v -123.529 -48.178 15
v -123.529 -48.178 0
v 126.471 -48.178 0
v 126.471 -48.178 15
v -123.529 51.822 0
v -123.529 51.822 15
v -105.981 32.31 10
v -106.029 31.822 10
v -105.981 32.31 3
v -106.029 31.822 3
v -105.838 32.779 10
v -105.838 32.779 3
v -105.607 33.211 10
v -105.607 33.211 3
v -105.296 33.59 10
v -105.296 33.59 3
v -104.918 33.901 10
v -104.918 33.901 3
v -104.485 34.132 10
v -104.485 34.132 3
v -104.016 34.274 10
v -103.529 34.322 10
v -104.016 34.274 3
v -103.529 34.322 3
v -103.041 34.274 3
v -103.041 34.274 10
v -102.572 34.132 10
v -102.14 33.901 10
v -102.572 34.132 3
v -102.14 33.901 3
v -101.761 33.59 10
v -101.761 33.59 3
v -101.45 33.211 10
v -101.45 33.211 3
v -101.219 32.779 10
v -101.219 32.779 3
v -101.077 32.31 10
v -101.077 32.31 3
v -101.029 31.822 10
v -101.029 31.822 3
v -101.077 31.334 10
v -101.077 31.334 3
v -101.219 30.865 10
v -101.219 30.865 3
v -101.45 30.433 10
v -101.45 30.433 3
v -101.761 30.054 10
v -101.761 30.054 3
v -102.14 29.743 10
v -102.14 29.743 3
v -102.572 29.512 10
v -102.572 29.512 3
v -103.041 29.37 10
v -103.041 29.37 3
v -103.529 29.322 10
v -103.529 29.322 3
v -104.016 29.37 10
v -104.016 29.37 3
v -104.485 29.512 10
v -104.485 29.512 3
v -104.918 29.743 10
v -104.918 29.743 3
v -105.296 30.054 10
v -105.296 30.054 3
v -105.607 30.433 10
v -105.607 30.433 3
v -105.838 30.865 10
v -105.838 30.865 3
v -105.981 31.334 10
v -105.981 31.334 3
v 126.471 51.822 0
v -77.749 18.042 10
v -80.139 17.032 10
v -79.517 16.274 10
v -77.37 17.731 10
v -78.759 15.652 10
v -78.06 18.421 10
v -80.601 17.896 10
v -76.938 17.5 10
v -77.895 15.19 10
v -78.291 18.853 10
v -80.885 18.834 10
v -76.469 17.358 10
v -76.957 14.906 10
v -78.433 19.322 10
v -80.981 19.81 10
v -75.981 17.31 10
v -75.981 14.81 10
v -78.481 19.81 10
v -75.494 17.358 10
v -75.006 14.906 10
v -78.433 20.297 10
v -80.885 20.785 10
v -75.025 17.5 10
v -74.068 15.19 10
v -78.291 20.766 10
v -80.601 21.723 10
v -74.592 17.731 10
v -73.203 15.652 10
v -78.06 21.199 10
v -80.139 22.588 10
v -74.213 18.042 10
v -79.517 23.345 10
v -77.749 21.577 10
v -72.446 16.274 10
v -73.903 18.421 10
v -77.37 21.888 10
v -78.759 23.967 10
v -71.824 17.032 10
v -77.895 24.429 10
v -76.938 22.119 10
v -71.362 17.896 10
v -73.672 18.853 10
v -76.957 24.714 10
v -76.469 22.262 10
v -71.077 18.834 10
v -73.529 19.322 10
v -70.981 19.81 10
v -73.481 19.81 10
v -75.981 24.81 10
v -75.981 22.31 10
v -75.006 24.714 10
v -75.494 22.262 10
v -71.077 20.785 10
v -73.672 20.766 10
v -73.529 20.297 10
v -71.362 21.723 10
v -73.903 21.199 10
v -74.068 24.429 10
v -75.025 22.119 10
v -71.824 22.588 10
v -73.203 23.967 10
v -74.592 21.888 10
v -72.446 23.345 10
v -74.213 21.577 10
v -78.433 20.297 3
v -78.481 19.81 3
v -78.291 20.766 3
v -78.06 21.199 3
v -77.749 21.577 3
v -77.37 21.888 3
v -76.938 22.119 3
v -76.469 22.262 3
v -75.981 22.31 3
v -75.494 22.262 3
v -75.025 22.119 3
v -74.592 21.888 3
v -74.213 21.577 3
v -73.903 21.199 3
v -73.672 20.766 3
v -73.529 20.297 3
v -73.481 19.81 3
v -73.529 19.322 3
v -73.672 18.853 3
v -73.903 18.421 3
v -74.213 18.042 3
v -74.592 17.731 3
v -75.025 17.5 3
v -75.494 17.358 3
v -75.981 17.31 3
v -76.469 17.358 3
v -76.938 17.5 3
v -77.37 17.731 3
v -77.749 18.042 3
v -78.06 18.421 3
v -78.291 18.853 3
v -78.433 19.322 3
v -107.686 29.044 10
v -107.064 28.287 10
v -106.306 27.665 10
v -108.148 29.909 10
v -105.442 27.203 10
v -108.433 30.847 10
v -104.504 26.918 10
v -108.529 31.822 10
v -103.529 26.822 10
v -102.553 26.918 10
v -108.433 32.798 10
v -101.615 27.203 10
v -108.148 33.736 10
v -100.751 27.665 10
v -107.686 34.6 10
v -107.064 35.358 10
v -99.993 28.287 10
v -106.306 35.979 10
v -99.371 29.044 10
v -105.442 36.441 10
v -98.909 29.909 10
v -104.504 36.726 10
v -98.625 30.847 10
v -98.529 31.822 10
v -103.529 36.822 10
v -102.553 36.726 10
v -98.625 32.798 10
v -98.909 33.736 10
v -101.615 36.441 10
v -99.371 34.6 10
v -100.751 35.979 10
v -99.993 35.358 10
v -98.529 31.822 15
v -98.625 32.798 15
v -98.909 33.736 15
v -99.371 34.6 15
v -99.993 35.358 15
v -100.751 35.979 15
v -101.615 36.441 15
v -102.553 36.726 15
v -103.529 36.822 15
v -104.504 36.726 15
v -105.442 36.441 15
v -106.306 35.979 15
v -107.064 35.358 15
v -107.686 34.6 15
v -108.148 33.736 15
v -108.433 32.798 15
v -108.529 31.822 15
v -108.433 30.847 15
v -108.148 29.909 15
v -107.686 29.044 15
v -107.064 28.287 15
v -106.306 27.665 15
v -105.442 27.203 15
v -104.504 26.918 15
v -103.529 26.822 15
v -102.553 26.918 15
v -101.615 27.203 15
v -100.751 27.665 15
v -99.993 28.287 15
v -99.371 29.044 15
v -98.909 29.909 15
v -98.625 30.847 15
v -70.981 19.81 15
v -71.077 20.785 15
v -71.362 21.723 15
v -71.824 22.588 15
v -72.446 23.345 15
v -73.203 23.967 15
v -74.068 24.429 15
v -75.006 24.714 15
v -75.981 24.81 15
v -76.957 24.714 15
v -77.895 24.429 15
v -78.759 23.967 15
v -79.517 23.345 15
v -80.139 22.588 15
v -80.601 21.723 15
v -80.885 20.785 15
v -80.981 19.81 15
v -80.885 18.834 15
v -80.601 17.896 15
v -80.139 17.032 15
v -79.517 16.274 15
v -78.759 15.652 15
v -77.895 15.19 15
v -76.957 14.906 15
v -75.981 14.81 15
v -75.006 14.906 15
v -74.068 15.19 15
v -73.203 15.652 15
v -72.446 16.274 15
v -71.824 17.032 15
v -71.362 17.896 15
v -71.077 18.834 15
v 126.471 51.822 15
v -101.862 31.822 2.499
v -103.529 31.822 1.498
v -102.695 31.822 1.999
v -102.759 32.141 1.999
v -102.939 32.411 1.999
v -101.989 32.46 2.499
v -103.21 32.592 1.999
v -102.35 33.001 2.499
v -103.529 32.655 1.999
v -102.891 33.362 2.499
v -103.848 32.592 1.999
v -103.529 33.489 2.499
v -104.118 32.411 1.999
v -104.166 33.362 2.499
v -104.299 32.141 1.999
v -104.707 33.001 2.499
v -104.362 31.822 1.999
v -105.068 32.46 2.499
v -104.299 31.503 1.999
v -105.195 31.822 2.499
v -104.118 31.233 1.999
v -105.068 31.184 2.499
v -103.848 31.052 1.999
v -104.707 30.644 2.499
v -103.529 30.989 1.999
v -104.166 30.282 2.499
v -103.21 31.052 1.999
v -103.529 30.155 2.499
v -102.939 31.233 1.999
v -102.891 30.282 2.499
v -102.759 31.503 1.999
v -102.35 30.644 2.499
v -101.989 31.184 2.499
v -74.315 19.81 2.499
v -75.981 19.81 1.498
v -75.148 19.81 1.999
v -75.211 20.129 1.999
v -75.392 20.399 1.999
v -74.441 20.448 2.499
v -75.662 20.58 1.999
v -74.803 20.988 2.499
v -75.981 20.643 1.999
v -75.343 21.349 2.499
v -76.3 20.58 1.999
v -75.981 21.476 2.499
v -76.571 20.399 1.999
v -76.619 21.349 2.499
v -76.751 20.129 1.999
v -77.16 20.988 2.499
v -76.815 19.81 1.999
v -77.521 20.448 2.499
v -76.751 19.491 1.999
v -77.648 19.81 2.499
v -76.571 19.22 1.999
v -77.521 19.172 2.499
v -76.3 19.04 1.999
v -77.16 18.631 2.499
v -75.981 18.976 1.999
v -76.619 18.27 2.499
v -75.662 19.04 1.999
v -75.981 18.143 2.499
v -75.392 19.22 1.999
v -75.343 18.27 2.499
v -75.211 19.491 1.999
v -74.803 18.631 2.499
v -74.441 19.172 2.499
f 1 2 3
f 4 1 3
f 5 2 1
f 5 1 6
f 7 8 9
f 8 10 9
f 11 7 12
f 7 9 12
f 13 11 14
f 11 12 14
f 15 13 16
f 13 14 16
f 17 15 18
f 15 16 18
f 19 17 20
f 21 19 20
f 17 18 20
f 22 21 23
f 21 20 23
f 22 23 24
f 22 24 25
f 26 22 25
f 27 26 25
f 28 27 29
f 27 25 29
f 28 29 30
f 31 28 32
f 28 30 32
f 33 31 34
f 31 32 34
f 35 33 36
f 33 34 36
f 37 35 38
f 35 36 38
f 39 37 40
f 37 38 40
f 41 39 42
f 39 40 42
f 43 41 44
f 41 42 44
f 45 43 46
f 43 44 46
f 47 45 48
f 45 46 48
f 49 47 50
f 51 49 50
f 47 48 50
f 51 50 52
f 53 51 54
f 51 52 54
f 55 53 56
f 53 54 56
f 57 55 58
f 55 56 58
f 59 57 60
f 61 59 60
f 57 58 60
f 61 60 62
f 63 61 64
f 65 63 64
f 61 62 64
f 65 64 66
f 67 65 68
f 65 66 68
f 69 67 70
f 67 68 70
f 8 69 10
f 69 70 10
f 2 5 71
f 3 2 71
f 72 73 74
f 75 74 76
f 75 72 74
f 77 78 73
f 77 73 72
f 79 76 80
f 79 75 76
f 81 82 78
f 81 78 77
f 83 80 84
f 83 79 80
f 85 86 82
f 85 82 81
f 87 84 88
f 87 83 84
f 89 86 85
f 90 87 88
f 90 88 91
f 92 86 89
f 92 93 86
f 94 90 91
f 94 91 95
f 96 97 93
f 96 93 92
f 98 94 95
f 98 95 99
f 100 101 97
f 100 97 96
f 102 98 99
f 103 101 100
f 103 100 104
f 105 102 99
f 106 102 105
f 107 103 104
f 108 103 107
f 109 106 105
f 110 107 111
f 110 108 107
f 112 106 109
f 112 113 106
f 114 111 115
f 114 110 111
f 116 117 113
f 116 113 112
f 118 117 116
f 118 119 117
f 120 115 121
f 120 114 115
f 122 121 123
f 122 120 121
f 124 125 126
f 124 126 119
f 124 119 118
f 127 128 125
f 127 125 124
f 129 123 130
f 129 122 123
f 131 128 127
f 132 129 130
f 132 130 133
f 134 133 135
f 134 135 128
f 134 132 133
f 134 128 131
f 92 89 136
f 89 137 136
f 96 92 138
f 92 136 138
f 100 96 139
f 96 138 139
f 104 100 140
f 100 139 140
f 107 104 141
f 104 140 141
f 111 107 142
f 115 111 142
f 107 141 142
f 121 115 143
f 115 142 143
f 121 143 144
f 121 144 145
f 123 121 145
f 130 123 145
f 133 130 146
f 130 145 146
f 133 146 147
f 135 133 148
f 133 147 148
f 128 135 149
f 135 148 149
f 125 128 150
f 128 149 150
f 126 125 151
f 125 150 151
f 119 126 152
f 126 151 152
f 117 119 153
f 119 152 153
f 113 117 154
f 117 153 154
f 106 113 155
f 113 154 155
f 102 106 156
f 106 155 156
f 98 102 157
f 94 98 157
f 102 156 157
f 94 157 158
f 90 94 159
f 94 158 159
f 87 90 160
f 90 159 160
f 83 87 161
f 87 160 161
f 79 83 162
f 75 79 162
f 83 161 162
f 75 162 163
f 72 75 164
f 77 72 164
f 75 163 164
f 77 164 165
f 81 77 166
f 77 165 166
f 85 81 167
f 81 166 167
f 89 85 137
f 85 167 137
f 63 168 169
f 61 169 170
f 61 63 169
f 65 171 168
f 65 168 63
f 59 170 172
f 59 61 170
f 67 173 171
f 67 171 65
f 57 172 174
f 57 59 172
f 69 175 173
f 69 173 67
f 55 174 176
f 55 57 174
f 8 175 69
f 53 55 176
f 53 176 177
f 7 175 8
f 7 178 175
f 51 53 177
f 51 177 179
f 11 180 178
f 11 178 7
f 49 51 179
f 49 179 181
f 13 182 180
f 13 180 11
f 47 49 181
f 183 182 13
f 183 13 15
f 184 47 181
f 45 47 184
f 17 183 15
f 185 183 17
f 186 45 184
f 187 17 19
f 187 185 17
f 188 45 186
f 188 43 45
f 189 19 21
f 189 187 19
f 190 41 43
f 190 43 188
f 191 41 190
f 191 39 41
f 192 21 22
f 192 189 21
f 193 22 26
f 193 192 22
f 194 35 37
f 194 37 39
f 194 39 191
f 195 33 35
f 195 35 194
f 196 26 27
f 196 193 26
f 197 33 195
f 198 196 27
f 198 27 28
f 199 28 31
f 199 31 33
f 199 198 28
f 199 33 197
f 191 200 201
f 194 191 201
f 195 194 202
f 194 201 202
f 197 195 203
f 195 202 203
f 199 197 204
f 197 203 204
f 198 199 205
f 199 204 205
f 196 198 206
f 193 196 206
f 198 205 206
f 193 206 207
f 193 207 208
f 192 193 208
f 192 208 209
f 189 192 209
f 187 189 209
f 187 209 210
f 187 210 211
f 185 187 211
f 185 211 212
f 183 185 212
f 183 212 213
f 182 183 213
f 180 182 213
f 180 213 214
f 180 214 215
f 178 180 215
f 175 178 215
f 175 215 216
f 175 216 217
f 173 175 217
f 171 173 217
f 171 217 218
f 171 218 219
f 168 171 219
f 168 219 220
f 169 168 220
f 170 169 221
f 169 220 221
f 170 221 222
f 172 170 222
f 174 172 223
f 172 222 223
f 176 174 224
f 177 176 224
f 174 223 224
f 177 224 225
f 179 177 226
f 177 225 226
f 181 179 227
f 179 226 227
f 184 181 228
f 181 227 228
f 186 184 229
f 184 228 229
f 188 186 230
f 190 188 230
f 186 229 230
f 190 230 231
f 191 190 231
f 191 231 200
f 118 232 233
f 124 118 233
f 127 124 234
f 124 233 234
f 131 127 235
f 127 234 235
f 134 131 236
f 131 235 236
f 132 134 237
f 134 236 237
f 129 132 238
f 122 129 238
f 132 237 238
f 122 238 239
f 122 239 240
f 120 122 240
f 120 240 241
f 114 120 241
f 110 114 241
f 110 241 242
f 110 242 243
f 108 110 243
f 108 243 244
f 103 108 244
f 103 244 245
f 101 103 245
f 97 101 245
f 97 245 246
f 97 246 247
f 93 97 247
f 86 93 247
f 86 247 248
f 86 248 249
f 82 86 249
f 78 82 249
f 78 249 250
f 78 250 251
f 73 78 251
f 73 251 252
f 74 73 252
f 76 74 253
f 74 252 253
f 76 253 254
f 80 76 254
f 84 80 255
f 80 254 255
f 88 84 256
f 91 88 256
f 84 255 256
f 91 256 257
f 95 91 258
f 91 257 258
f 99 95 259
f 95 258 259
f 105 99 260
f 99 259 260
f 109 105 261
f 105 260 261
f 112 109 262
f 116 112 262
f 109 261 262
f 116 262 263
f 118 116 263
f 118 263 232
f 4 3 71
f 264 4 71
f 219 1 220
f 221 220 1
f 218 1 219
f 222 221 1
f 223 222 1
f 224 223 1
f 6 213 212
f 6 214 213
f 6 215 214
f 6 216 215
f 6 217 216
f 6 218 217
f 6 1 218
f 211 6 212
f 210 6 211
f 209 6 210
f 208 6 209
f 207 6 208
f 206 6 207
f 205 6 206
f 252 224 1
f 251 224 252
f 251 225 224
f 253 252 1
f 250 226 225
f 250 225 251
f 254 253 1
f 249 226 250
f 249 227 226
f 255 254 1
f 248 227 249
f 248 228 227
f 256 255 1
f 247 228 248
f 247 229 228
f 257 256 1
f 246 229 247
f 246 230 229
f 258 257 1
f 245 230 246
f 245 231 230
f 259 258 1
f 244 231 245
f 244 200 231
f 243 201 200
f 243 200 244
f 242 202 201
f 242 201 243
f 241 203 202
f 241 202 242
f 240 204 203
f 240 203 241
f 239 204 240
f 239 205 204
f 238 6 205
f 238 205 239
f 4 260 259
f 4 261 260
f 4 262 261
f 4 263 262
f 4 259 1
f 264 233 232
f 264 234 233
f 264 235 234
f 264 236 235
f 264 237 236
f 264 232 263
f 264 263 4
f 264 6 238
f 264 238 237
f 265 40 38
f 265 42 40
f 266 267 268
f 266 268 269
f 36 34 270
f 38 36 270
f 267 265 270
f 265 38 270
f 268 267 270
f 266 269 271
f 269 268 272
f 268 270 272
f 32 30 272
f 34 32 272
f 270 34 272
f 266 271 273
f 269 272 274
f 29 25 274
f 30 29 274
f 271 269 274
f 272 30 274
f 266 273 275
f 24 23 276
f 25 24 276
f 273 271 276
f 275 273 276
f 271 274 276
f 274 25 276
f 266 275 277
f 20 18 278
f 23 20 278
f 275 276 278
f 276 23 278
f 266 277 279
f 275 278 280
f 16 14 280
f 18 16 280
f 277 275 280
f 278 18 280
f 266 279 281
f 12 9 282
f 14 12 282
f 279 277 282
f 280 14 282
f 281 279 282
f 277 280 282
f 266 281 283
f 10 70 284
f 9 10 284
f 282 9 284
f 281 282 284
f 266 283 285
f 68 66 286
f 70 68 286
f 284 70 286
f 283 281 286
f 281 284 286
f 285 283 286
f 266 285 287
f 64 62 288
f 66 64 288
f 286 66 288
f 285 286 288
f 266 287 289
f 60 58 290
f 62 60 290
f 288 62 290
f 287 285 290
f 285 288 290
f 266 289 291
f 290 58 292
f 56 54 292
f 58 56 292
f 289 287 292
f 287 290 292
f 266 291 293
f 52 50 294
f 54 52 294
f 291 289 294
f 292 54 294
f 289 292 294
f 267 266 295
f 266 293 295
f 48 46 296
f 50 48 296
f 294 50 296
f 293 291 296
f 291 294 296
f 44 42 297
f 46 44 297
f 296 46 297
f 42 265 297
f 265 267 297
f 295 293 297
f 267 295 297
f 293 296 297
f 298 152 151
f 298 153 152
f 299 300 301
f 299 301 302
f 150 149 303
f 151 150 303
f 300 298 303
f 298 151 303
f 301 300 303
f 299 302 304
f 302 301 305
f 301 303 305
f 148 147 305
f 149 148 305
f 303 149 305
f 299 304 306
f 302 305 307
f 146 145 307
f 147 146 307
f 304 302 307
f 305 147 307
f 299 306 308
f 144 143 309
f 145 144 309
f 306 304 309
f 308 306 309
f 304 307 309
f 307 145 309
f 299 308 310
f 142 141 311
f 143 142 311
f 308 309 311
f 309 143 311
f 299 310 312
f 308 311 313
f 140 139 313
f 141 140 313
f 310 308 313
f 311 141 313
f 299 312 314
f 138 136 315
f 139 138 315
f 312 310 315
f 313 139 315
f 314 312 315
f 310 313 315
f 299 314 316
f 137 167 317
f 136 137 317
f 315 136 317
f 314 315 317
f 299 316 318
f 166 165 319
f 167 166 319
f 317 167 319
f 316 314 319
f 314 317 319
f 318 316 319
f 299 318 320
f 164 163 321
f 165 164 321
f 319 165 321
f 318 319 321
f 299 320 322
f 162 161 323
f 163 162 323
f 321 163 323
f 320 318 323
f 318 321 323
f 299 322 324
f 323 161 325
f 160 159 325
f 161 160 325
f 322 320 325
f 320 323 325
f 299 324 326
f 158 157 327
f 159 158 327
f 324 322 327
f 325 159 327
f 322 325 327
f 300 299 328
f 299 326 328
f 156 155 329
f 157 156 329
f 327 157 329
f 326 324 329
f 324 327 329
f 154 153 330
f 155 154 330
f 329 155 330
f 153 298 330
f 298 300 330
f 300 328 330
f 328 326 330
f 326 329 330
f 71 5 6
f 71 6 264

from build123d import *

# Parameters (mm, degrees)
F0_W           = 250
F0_H           = 100
F1_DEPTH       = 15
F3_D           = 5
F3_DEPTH       = 12
F3_CBORE_D     = 10
F3_CBORE_DEPTH = 5
F3_TIP         = 1.5021515476


with BuildPart() as f1:
    # F0 (on Top) → F1 (new body)
    with BuildSketch(Plane.XY):
        with Locations((1.4713872279, 1.8220841885)):
            Rectangle(F0_W, F0_H)
    extrude(amount=F1_DEPTH)

    # F3
    with Locations(Plane.XY.offset(15)):
        with Locations((-103.5286127721, 31.8220841885), (-75.9812488966, 19.8097003586)):
            CounterBoreHole(F3_D / 2, F3_CBORE_D / 2, F3_CBORE_DEPTH, depth=F3_DEPTH)
            with Locations((0, 0, -(F3_DEPTH + F3_TIP / 2))):  # 118° drill point
                Cone(0, F3_D / 2, F3_TIP, mode=Mode.SUBTRACT)


solid = f1.part
